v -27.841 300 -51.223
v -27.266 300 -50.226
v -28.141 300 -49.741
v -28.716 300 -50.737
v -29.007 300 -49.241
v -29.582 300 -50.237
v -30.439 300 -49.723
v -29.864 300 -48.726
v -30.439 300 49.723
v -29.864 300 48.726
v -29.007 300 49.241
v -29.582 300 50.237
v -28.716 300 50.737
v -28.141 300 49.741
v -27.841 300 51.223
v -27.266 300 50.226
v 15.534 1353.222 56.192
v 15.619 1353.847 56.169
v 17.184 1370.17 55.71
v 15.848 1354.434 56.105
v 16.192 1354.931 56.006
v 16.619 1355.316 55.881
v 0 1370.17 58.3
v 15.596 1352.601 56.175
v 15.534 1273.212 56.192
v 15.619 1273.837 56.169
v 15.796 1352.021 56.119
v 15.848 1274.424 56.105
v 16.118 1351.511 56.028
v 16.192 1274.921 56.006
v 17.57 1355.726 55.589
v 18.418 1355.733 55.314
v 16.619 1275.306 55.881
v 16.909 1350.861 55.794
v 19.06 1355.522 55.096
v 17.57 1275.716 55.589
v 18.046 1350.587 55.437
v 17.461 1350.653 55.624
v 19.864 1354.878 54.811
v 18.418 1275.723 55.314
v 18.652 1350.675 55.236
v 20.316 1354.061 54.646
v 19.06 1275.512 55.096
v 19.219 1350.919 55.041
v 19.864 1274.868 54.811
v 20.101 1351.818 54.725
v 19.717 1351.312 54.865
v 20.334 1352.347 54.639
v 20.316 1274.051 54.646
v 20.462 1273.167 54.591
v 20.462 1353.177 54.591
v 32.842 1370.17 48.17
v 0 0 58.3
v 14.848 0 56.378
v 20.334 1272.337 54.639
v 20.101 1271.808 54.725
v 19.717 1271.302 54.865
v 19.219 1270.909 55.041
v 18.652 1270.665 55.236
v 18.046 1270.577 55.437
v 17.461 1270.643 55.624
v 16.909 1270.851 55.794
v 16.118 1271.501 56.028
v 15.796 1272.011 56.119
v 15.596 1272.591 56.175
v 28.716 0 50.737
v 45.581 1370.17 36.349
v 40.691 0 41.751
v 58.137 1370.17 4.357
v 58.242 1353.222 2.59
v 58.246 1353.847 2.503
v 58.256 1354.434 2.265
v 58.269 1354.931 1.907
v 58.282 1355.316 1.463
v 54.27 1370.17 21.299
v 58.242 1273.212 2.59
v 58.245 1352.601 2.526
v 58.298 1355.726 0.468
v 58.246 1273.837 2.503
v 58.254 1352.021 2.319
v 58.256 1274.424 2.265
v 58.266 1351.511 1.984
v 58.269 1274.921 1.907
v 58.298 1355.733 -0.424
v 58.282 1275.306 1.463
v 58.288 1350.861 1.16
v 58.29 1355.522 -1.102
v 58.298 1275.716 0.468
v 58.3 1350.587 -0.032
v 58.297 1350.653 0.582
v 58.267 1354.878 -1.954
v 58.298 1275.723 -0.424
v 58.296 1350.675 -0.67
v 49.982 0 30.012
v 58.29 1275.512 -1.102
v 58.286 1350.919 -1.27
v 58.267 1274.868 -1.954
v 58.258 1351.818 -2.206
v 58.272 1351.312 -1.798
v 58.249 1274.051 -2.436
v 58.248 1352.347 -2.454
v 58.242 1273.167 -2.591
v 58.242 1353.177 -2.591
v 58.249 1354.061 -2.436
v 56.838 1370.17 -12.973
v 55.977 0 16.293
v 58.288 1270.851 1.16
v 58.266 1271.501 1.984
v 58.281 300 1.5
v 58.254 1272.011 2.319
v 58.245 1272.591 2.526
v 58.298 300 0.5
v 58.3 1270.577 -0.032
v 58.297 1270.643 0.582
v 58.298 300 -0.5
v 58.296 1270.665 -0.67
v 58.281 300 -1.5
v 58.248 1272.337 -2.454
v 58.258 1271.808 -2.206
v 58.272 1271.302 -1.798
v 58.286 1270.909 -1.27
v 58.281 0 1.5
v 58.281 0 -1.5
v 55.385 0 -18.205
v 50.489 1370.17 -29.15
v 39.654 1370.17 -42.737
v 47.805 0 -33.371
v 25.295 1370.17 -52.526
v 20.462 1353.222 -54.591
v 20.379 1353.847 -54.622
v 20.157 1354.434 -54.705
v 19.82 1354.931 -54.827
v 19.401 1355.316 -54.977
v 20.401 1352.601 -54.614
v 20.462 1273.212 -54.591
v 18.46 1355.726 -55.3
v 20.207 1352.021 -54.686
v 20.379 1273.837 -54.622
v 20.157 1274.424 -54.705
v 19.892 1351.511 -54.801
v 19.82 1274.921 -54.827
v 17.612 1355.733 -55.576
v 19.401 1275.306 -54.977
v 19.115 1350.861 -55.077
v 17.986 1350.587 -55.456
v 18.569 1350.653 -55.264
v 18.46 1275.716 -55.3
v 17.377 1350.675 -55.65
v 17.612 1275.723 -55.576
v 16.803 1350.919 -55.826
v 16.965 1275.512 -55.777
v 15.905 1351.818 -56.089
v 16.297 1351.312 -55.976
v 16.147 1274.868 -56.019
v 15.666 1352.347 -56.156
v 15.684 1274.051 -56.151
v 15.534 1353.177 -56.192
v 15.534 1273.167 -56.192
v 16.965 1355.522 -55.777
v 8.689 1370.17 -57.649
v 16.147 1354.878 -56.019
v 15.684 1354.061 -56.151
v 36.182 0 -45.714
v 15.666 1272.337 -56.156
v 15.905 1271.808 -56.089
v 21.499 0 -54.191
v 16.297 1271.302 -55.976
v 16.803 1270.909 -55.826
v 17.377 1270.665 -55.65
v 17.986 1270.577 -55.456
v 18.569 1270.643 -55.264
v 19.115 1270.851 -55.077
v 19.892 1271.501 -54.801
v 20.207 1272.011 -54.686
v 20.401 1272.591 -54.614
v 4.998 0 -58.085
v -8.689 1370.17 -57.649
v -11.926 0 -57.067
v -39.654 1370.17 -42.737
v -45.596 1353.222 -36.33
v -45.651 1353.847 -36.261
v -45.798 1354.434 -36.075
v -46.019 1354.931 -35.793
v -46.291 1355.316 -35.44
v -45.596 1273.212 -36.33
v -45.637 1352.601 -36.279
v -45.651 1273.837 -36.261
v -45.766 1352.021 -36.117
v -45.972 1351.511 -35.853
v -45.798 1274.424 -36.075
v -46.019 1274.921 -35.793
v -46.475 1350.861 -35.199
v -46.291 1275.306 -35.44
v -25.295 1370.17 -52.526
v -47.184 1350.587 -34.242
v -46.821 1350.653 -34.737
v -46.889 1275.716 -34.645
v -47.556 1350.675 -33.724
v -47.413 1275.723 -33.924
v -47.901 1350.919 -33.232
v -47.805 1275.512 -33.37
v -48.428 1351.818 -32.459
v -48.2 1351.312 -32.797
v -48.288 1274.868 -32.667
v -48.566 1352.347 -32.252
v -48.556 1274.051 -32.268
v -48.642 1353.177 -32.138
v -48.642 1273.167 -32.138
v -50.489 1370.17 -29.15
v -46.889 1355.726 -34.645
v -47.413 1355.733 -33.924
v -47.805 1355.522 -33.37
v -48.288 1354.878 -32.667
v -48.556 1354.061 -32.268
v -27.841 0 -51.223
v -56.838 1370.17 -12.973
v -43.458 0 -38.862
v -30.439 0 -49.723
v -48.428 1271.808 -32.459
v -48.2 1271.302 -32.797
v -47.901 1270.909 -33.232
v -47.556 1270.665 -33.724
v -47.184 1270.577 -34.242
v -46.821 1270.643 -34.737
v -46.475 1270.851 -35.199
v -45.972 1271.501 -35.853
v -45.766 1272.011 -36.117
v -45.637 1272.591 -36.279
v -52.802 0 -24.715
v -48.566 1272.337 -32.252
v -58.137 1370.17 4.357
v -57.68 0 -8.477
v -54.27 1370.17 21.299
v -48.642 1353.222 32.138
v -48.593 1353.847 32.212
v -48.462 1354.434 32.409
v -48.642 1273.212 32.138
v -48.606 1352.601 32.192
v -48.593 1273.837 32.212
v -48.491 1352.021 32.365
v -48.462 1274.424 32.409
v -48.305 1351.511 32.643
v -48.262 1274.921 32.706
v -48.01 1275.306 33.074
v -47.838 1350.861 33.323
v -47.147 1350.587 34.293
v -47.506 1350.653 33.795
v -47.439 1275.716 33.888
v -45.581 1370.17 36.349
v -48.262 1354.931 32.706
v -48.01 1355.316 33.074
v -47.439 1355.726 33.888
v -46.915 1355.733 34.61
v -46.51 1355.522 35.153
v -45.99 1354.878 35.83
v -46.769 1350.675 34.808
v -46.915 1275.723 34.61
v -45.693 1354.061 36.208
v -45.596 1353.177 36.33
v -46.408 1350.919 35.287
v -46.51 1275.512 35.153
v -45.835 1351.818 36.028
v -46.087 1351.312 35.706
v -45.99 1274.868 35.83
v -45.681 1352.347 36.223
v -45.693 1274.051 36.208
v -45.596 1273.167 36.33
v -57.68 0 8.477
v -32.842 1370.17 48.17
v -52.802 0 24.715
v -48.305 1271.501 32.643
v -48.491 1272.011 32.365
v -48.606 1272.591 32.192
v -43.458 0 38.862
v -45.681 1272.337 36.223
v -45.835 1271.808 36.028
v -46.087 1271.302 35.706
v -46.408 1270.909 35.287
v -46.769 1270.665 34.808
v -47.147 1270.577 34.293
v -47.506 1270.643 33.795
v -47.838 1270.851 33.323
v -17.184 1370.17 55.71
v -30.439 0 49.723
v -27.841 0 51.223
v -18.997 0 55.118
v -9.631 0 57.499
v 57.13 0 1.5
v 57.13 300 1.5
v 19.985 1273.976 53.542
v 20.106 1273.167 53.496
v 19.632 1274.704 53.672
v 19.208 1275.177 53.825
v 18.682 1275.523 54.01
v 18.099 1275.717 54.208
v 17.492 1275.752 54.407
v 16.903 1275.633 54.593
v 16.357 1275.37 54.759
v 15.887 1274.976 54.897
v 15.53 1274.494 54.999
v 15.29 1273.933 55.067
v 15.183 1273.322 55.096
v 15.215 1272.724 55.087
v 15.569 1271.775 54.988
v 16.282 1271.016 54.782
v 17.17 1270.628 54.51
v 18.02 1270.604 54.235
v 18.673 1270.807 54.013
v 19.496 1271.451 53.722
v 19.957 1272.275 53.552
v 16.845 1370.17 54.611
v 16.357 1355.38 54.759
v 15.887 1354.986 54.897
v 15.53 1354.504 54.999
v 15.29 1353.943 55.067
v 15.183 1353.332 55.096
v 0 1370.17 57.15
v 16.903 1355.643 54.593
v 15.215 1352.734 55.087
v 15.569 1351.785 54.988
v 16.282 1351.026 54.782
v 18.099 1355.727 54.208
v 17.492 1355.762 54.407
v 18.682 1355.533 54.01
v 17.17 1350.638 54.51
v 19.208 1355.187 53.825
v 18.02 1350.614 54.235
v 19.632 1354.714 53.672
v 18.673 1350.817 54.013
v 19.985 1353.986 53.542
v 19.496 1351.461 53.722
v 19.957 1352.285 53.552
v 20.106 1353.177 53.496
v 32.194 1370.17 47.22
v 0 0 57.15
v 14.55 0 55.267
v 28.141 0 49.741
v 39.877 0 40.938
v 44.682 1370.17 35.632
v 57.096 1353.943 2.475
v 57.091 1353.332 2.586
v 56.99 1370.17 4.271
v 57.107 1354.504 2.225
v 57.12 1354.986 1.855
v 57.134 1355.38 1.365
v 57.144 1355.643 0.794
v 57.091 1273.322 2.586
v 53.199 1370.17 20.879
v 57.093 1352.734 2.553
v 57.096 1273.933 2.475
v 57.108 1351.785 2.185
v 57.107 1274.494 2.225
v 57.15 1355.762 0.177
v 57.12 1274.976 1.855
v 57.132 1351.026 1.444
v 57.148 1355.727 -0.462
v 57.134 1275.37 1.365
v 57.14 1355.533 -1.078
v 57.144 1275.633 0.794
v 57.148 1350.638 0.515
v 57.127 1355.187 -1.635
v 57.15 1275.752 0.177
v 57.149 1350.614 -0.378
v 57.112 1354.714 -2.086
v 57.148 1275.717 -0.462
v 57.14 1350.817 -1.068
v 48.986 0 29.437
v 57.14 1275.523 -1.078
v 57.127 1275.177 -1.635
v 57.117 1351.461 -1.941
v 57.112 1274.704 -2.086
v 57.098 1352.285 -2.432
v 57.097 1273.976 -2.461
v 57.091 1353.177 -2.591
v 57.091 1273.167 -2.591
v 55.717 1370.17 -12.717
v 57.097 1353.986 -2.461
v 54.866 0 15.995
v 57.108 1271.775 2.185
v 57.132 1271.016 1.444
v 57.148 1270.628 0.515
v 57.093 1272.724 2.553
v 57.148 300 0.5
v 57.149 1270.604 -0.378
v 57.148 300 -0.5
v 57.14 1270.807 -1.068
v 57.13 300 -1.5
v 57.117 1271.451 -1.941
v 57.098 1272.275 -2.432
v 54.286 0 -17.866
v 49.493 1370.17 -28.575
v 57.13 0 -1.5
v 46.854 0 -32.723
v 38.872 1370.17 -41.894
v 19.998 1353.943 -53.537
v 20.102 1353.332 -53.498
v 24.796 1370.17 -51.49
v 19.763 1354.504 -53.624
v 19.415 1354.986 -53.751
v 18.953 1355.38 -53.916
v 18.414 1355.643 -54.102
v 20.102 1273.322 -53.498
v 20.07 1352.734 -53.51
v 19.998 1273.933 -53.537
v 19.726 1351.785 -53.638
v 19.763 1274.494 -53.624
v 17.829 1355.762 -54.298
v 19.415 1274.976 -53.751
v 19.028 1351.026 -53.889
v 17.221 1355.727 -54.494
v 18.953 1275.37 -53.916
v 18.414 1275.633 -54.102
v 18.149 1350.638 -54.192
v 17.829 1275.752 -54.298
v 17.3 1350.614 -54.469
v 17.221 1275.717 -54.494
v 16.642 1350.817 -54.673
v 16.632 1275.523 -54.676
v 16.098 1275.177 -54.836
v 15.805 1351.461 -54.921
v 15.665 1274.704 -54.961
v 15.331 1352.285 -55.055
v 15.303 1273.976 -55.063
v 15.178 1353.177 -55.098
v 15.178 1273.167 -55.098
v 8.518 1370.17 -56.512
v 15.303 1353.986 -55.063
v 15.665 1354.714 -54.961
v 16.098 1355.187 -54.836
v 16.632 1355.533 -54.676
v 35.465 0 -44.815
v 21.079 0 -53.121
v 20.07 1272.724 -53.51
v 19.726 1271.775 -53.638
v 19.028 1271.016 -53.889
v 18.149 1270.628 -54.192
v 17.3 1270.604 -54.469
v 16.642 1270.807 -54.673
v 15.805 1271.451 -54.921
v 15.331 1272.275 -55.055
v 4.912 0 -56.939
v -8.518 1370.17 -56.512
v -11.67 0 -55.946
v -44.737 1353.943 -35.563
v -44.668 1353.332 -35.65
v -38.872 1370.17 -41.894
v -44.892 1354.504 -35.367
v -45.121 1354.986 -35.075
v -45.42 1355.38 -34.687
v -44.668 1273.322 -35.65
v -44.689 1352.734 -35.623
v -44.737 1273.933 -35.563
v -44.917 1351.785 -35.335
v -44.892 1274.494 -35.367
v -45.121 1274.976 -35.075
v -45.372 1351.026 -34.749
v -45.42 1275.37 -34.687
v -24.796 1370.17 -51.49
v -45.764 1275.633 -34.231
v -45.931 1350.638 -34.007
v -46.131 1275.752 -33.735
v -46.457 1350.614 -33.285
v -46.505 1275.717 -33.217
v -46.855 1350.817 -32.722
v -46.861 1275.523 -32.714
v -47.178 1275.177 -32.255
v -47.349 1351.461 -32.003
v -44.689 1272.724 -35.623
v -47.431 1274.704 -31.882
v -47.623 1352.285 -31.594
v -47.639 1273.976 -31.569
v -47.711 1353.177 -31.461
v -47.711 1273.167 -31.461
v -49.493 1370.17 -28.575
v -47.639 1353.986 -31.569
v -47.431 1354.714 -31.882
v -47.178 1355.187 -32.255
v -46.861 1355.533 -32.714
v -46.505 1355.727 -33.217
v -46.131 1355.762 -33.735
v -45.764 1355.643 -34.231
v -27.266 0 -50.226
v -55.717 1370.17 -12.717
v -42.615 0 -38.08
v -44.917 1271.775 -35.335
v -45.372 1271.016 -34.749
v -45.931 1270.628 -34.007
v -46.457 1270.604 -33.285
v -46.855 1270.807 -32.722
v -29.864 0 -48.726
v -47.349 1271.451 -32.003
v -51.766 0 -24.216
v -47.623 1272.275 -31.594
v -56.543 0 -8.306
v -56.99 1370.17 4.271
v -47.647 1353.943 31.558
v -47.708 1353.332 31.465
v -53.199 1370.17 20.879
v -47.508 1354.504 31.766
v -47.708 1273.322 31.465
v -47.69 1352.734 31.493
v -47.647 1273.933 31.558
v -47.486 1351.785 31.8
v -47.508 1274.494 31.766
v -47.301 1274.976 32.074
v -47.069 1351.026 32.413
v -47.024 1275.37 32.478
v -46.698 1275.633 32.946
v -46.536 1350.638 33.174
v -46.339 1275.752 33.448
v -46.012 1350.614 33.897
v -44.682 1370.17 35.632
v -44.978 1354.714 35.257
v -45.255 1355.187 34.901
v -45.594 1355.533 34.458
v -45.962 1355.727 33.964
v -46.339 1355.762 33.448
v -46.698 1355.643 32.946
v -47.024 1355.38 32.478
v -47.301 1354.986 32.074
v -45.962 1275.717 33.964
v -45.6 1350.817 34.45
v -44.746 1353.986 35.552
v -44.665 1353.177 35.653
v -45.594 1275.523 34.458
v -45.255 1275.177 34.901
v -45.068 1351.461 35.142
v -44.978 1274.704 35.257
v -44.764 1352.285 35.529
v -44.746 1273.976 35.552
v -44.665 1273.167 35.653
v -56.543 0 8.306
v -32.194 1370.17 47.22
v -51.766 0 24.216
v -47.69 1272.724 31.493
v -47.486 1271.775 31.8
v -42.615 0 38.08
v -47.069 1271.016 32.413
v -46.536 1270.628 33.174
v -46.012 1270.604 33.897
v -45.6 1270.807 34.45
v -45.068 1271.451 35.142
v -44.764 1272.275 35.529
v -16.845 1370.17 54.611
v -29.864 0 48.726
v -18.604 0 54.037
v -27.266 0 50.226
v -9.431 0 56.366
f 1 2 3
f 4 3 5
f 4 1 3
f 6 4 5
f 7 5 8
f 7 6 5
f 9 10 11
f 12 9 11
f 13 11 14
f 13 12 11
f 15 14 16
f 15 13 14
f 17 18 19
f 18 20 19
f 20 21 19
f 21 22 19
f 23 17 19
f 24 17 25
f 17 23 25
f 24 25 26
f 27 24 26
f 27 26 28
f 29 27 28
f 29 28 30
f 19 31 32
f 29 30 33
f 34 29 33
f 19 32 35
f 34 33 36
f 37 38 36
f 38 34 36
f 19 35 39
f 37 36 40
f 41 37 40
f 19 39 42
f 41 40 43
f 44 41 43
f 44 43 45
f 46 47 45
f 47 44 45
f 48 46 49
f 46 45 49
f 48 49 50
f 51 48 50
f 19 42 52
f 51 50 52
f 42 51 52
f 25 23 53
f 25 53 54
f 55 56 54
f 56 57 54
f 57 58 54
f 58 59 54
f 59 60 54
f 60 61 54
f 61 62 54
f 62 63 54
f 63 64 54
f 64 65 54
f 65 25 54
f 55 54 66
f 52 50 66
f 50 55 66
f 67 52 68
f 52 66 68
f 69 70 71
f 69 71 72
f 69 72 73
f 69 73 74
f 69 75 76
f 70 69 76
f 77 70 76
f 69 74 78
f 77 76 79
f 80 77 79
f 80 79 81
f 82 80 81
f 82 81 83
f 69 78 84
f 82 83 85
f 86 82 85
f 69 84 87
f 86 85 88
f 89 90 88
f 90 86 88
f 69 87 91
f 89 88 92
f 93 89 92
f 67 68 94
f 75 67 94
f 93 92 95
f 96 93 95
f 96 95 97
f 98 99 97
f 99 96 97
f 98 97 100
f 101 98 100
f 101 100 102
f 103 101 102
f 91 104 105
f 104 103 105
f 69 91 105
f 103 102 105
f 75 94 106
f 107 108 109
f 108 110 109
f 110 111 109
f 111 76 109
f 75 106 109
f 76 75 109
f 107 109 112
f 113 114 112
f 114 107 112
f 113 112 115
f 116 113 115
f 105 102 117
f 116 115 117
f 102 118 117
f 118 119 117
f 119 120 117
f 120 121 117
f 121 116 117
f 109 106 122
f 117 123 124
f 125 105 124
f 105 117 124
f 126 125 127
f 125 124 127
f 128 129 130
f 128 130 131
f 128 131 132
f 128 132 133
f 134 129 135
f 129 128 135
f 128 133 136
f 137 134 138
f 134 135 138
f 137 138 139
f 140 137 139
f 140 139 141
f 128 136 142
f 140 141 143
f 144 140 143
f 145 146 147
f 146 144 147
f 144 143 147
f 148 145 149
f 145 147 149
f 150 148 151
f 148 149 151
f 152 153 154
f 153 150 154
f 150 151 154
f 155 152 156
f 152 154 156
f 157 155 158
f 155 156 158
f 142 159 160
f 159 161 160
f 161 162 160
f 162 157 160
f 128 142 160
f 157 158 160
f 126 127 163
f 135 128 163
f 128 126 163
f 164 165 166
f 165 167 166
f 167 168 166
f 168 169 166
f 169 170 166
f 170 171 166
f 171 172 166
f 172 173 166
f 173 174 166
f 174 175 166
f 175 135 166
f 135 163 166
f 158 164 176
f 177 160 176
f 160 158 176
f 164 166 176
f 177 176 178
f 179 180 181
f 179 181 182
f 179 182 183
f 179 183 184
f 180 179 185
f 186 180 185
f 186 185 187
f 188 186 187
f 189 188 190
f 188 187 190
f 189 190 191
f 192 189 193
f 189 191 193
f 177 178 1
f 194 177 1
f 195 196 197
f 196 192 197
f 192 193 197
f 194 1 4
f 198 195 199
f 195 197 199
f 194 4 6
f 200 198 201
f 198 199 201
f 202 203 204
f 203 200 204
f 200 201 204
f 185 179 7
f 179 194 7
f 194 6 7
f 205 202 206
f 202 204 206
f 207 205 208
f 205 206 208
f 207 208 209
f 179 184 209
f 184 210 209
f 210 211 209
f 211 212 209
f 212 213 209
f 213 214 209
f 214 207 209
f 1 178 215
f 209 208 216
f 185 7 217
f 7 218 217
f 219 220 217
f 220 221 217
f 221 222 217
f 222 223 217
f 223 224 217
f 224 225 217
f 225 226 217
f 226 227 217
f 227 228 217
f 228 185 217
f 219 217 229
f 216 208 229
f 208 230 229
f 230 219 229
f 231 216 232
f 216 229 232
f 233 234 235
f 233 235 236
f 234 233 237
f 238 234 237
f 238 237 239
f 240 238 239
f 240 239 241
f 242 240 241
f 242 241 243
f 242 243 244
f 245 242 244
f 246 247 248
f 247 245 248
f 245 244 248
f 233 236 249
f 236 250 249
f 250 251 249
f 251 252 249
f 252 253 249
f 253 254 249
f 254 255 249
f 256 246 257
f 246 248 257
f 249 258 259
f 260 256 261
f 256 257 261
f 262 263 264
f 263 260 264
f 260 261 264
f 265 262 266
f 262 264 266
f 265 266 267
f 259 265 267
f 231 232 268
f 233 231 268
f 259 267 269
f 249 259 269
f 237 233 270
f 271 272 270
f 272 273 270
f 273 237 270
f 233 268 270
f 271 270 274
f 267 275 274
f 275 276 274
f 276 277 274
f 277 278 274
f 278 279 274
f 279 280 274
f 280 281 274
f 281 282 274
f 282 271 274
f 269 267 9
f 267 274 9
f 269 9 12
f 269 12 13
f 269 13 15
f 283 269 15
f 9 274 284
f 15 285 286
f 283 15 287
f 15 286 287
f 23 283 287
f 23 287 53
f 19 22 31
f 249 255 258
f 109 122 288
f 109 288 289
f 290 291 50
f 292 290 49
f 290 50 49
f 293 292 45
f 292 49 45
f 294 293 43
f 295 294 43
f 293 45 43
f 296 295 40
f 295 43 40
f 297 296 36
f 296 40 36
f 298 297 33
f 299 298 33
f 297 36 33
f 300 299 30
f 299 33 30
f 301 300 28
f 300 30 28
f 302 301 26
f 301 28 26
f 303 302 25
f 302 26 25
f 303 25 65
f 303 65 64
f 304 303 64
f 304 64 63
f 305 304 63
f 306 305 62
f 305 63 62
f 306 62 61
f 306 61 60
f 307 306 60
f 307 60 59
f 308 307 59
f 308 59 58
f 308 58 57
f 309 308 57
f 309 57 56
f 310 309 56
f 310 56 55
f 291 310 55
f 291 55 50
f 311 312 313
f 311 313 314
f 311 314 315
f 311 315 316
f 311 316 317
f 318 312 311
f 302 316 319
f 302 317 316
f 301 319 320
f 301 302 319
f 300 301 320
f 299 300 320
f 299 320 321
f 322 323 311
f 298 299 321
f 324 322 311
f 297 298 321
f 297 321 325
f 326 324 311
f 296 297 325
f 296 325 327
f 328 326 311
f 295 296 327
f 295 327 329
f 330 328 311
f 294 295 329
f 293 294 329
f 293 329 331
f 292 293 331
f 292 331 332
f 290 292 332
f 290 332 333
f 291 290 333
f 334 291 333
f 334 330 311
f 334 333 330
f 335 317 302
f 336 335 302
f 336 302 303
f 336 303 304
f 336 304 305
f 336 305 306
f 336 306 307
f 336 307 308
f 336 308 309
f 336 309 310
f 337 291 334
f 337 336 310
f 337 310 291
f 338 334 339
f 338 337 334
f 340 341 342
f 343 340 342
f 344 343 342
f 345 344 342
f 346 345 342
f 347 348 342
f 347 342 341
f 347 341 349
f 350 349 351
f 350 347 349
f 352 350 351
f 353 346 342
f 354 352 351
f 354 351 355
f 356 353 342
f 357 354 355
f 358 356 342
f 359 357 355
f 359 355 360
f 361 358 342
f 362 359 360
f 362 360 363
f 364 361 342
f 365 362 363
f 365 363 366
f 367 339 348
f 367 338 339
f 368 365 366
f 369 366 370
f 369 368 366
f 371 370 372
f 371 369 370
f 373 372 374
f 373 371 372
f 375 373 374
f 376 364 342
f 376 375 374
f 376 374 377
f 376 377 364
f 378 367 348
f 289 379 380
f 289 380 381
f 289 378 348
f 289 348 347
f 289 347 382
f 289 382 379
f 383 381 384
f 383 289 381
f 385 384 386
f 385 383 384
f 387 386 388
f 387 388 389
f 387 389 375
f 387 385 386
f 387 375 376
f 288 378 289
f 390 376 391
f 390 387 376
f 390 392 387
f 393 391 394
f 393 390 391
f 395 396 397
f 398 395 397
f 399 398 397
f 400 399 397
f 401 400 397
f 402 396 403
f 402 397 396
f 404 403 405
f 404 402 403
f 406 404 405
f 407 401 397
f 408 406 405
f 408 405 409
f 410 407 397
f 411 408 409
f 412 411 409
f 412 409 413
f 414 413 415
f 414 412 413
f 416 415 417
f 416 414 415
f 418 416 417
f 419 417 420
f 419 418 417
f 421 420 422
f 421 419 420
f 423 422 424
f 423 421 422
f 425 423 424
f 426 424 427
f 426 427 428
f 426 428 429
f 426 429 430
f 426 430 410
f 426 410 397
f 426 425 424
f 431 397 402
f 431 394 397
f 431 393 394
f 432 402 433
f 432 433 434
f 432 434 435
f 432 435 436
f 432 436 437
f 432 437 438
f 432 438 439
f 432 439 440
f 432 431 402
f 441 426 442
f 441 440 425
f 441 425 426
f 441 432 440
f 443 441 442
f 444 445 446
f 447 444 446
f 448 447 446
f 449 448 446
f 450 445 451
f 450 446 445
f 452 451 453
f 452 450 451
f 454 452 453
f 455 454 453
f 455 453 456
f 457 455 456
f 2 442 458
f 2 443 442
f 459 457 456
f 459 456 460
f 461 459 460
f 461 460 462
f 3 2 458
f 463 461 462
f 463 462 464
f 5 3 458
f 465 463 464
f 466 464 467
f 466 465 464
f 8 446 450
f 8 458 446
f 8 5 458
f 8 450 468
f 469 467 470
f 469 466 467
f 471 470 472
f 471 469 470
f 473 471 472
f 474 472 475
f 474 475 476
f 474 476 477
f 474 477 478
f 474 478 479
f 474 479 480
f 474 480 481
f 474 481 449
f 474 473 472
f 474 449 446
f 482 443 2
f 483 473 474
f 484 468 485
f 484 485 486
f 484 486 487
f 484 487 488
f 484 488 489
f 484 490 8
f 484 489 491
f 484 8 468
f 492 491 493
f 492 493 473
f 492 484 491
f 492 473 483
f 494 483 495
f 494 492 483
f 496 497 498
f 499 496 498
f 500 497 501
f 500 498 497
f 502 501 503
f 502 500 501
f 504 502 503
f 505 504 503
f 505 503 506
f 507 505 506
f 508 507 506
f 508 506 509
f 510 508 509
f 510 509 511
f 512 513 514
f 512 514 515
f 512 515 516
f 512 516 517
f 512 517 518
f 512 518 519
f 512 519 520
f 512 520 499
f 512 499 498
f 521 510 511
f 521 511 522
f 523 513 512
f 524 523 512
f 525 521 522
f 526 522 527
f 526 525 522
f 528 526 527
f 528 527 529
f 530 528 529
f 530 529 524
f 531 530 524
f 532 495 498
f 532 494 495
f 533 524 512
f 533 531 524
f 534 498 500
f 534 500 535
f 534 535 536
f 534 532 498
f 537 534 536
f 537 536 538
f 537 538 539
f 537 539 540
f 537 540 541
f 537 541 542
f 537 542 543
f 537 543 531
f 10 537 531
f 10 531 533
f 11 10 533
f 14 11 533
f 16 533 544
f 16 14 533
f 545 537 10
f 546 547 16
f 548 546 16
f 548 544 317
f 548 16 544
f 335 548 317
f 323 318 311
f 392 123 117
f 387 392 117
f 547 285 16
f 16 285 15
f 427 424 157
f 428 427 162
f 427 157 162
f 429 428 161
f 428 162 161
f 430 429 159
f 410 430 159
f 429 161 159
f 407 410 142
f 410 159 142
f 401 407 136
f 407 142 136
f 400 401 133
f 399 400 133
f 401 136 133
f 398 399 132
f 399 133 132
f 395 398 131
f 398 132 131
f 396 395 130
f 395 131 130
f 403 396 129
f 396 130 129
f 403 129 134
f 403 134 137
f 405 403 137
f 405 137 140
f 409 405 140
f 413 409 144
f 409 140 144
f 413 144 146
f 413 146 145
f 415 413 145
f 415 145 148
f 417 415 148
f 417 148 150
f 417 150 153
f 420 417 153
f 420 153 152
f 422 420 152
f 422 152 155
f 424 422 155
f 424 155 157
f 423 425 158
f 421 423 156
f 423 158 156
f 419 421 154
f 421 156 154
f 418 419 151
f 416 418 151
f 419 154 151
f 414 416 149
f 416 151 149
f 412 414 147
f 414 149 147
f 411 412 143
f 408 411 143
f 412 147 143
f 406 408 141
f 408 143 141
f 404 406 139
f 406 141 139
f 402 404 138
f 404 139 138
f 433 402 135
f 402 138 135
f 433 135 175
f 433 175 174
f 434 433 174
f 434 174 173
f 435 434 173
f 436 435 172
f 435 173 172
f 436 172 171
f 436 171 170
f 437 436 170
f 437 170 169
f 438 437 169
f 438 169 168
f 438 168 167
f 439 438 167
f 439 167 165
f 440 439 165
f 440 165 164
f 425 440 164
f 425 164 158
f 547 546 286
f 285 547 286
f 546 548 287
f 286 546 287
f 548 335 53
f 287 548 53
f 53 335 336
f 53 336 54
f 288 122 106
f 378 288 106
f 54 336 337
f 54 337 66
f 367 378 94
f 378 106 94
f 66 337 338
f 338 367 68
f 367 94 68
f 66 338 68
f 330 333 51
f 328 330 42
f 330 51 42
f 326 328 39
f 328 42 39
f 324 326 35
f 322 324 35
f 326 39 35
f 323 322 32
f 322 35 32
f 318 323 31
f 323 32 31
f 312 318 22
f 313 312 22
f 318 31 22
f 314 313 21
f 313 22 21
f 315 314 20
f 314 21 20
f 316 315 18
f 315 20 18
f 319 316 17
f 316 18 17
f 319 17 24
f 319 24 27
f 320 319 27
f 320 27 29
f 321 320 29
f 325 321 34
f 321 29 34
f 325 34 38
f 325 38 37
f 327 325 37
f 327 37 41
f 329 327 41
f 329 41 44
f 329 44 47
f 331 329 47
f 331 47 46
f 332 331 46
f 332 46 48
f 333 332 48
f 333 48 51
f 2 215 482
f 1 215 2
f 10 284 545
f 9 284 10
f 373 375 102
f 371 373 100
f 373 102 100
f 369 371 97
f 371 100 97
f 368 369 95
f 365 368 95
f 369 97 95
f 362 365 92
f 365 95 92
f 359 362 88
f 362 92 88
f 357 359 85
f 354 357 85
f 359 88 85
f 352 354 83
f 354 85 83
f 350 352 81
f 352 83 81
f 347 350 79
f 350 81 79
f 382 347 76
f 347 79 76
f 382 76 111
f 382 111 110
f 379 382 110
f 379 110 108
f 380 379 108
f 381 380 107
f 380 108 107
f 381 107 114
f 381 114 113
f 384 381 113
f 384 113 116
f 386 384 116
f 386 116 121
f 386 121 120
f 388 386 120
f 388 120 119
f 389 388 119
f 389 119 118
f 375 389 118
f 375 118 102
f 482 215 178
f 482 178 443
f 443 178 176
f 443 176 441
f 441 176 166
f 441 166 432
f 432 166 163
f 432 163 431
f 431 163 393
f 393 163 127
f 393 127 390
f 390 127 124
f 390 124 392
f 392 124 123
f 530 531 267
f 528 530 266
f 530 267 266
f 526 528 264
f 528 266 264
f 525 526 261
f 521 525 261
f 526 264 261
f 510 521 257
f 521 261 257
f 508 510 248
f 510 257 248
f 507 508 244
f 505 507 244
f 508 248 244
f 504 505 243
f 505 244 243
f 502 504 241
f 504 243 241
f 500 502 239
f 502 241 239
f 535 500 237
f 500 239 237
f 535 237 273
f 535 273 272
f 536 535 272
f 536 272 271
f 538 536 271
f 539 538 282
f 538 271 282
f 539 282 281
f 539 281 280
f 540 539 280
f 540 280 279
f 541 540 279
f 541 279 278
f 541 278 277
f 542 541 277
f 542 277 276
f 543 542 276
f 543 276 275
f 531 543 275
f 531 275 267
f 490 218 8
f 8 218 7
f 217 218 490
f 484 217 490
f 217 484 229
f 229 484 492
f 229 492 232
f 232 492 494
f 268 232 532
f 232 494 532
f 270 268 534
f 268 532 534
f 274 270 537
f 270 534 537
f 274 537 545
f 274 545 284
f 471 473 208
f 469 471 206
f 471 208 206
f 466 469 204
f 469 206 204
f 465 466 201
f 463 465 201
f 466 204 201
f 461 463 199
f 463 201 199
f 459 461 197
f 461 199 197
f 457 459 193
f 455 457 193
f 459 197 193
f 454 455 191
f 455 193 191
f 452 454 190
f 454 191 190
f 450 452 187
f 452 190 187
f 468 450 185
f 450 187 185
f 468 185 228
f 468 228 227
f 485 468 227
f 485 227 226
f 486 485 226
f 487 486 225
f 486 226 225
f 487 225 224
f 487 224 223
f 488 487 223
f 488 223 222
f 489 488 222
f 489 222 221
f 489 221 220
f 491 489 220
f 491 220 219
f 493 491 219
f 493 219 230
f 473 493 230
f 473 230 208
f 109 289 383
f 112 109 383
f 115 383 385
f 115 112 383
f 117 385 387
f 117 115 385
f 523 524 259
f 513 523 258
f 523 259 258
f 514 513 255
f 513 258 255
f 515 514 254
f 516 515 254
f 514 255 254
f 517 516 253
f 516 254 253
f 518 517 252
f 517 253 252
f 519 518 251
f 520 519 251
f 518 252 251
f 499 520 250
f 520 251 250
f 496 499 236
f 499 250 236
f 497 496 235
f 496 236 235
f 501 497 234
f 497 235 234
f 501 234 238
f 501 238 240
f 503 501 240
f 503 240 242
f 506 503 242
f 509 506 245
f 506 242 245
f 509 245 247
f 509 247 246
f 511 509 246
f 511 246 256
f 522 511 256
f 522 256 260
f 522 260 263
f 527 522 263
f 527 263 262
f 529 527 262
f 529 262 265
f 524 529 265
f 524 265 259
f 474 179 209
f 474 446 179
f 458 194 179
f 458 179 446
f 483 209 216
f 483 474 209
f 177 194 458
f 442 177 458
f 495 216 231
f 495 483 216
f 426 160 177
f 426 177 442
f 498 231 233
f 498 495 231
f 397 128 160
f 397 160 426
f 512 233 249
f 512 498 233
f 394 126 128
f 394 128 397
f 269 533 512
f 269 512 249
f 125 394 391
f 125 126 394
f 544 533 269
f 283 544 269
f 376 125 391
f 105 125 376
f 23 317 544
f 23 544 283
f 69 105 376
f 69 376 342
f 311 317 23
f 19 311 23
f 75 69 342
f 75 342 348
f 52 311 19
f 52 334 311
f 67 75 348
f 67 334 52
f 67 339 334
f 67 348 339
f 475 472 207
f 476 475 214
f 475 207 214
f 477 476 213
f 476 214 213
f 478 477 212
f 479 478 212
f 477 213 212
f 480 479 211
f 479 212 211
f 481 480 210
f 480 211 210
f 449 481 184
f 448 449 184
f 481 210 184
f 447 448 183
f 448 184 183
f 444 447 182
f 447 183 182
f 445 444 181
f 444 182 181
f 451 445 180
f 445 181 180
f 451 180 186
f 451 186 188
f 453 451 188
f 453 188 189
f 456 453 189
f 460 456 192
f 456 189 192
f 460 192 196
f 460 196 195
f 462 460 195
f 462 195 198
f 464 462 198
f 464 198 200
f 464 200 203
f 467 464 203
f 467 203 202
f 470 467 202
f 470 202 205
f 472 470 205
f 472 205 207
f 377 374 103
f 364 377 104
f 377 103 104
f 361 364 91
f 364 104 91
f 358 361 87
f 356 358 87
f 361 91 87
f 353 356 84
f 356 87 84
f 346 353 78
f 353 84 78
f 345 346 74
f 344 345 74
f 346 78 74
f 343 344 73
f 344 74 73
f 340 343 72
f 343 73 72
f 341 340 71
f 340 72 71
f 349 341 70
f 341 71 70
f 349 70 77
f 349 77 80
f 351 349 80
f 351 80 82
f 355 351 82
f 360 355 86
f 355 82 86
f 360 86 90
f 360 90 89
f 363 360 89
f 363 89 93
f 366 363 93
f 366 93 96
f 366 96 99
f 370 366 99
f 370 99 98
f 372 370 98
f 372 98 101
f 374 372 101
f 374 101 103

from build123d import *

# Parameters (mm, degrees)
SKETCH1_R                       = 58.299985
BOSS_EXTRUDE1_DEPTH             = 1370.16998
SKETCH2_R                       = 57.15
CUT_EXTRUDE1_DEPTH              = 1370.16998
SKETCH3_W                       = 3
SKETCH3_H                       = 300
CUT_EXTRUDE2_DEPTH              = 10
CIRPATTERN1_COUNT               = 3
F_6_0_204_DIAMETER_HOLE1_REACH  = 1378.358
F_6_0_204_DIAMETER_HOLE1_BORE_R = 2.5908
CIRPATTERN2_COUNT               = 5


with BuildPart() as part:
    # Sketch1 → Boss-Extrude1 (new body)
    with BuildSketch(Plane(origin=(0, 0, 0), x_dir=(1, 0, 0), z_dir=(0, 1, 0))):
        with Locations(Location((0, 0, 0), (0, 0, 270))):
            Circle(SKETCH1_R)
    extrude(amount=BOSS_EXTRUDE1_DEPTH)

    # Sketch2 → Cut-Extrude1 (cut)
    with BuildSketch(Plane(origin=(0, 0, 0), x_dir=(1, 0, 0), z_dir=(0, 1, 0))):
        with Locations(Location((0, 0, 0), (0, 0, 270))):
            Circle(SKETCH2_R)
    extrude(amount=CUT_EXTRUDE1_DEPTH, mode=Mode.SUBTRACT)

    # Sketch3 → Cut-Extrude2 (cut)
    with BuildSketch(Plane(origin=(58.299985, 0, 0), x_dir=(0, 0, -1), z_dir=(1, 0, 0))):
        with Locations((0, 150)):
            Rectangle(SKETCH3_W, SKETCH3_H)
    cut_extrude2 = extrude(amount=-CUT_EXTRUDE2_DEPTH, mode=Mode.SUBTRACT)

    # CirPattern1: Cut-Extrude2 ×3 about axis
    cirpattern1_axis = Axis((0, 0, 0), (0, 1, 0))
    for i in range(1, CIRPATTERN1_COUNT):
        add(cut_extrude2.rotate(cirpattern1_axis, i * 360 / CIRPATTERN1_COUNT), mode=Mode.SUBTRACT)

    # #6 (0.204) Diameter Hole1 bore → #6 (0.204) Diameter Hole1 (cut, up to next)
    with BuildSketch(Plane(origin=(58.299985, 0, 0), x_dir=(0, 0, -1), z_dir=(1, 0, 0)), mode=Mode.PRIVATE) as f_6_0_204_diameter_hole1_sk1:
        with Locations((0, 1353.17738)):
            Circle(F_6_0_204_DIAMETER_HOLE1_BORE_R)
    f_6_0_204_diameter_hole1_tool1 = extrude(f_6_0_204_diameter_hole1_sk1.sketch, amount=-F_6_0_204_DIAMETER_HOLE1_REACH, mode=Mode.PRIVATE) & part.part
    # #6 (0.204) Diameter Hole1 bore → #6 (0.204) Diameter Hole1 (cut, up to next)
    with BuildSketch(Plane(origin=(58.299985, 0, 0), x_dir=(0, 0, -1), z_dir=(1, 0, 0)), mode=Mode.PRIVATE) as f_6_0_204_diameter_hole1_sk2:
        with Locations((0, 1273.16738)):
            Circle(F_6_0_204_DIAMETER_HOLE1_BORE_R)
    f_6_0_204_diameter_hole1_tool2 = extrude(f_6_0_204_diameter_hole1_sk2.sketch, amount=-F_6_0_204_DIAMETER_HOLE1_REACH, mode=Mode.PRIVATE) & part.part
    f_6_0_204_diameter_hole1_1 = f_6_0_204_diameter_hole1_tool1.solids().sort_by_distance((58.299985, 1353.17738, 0))[0]
    add(f_6_0_204_diameter_hole1_1, mode=Mode.SUBTRACT)
    f_6_0_204_diameter_hole1_2 = f_6_0_204_diameter_hole1_tool2.solids().sort_by_distance((58.299985, 1273.16738, 0))[0]
    add(f_6_0_204_diameter_hole1_2, mode=Mode.SUBTRACT)
    f_6_0_204_diameter_hole1 = f_6_0_204_diameter_hole1_1 + f_6_0_204_diameter_hole1_2  # #6 (0.204) Diameter Hole1 as one shape, for the pattern or mirror that repeats it

    # CirPattern2: #6 (0.204) Diameter Hole1 ×5 about axis
    cirpattern2_axis = Axis((0, 0, 0), (0, -1, 0))
    for i in range(1, CIRPATTERN2_COUNT):
        add(f_6_0_204_diameter_hole1.rotate(cirpattern2_axis, i * 360 / CIRPATTERN2_COUNT), mode=Mode.SUBTRACT)


solid = part.part
